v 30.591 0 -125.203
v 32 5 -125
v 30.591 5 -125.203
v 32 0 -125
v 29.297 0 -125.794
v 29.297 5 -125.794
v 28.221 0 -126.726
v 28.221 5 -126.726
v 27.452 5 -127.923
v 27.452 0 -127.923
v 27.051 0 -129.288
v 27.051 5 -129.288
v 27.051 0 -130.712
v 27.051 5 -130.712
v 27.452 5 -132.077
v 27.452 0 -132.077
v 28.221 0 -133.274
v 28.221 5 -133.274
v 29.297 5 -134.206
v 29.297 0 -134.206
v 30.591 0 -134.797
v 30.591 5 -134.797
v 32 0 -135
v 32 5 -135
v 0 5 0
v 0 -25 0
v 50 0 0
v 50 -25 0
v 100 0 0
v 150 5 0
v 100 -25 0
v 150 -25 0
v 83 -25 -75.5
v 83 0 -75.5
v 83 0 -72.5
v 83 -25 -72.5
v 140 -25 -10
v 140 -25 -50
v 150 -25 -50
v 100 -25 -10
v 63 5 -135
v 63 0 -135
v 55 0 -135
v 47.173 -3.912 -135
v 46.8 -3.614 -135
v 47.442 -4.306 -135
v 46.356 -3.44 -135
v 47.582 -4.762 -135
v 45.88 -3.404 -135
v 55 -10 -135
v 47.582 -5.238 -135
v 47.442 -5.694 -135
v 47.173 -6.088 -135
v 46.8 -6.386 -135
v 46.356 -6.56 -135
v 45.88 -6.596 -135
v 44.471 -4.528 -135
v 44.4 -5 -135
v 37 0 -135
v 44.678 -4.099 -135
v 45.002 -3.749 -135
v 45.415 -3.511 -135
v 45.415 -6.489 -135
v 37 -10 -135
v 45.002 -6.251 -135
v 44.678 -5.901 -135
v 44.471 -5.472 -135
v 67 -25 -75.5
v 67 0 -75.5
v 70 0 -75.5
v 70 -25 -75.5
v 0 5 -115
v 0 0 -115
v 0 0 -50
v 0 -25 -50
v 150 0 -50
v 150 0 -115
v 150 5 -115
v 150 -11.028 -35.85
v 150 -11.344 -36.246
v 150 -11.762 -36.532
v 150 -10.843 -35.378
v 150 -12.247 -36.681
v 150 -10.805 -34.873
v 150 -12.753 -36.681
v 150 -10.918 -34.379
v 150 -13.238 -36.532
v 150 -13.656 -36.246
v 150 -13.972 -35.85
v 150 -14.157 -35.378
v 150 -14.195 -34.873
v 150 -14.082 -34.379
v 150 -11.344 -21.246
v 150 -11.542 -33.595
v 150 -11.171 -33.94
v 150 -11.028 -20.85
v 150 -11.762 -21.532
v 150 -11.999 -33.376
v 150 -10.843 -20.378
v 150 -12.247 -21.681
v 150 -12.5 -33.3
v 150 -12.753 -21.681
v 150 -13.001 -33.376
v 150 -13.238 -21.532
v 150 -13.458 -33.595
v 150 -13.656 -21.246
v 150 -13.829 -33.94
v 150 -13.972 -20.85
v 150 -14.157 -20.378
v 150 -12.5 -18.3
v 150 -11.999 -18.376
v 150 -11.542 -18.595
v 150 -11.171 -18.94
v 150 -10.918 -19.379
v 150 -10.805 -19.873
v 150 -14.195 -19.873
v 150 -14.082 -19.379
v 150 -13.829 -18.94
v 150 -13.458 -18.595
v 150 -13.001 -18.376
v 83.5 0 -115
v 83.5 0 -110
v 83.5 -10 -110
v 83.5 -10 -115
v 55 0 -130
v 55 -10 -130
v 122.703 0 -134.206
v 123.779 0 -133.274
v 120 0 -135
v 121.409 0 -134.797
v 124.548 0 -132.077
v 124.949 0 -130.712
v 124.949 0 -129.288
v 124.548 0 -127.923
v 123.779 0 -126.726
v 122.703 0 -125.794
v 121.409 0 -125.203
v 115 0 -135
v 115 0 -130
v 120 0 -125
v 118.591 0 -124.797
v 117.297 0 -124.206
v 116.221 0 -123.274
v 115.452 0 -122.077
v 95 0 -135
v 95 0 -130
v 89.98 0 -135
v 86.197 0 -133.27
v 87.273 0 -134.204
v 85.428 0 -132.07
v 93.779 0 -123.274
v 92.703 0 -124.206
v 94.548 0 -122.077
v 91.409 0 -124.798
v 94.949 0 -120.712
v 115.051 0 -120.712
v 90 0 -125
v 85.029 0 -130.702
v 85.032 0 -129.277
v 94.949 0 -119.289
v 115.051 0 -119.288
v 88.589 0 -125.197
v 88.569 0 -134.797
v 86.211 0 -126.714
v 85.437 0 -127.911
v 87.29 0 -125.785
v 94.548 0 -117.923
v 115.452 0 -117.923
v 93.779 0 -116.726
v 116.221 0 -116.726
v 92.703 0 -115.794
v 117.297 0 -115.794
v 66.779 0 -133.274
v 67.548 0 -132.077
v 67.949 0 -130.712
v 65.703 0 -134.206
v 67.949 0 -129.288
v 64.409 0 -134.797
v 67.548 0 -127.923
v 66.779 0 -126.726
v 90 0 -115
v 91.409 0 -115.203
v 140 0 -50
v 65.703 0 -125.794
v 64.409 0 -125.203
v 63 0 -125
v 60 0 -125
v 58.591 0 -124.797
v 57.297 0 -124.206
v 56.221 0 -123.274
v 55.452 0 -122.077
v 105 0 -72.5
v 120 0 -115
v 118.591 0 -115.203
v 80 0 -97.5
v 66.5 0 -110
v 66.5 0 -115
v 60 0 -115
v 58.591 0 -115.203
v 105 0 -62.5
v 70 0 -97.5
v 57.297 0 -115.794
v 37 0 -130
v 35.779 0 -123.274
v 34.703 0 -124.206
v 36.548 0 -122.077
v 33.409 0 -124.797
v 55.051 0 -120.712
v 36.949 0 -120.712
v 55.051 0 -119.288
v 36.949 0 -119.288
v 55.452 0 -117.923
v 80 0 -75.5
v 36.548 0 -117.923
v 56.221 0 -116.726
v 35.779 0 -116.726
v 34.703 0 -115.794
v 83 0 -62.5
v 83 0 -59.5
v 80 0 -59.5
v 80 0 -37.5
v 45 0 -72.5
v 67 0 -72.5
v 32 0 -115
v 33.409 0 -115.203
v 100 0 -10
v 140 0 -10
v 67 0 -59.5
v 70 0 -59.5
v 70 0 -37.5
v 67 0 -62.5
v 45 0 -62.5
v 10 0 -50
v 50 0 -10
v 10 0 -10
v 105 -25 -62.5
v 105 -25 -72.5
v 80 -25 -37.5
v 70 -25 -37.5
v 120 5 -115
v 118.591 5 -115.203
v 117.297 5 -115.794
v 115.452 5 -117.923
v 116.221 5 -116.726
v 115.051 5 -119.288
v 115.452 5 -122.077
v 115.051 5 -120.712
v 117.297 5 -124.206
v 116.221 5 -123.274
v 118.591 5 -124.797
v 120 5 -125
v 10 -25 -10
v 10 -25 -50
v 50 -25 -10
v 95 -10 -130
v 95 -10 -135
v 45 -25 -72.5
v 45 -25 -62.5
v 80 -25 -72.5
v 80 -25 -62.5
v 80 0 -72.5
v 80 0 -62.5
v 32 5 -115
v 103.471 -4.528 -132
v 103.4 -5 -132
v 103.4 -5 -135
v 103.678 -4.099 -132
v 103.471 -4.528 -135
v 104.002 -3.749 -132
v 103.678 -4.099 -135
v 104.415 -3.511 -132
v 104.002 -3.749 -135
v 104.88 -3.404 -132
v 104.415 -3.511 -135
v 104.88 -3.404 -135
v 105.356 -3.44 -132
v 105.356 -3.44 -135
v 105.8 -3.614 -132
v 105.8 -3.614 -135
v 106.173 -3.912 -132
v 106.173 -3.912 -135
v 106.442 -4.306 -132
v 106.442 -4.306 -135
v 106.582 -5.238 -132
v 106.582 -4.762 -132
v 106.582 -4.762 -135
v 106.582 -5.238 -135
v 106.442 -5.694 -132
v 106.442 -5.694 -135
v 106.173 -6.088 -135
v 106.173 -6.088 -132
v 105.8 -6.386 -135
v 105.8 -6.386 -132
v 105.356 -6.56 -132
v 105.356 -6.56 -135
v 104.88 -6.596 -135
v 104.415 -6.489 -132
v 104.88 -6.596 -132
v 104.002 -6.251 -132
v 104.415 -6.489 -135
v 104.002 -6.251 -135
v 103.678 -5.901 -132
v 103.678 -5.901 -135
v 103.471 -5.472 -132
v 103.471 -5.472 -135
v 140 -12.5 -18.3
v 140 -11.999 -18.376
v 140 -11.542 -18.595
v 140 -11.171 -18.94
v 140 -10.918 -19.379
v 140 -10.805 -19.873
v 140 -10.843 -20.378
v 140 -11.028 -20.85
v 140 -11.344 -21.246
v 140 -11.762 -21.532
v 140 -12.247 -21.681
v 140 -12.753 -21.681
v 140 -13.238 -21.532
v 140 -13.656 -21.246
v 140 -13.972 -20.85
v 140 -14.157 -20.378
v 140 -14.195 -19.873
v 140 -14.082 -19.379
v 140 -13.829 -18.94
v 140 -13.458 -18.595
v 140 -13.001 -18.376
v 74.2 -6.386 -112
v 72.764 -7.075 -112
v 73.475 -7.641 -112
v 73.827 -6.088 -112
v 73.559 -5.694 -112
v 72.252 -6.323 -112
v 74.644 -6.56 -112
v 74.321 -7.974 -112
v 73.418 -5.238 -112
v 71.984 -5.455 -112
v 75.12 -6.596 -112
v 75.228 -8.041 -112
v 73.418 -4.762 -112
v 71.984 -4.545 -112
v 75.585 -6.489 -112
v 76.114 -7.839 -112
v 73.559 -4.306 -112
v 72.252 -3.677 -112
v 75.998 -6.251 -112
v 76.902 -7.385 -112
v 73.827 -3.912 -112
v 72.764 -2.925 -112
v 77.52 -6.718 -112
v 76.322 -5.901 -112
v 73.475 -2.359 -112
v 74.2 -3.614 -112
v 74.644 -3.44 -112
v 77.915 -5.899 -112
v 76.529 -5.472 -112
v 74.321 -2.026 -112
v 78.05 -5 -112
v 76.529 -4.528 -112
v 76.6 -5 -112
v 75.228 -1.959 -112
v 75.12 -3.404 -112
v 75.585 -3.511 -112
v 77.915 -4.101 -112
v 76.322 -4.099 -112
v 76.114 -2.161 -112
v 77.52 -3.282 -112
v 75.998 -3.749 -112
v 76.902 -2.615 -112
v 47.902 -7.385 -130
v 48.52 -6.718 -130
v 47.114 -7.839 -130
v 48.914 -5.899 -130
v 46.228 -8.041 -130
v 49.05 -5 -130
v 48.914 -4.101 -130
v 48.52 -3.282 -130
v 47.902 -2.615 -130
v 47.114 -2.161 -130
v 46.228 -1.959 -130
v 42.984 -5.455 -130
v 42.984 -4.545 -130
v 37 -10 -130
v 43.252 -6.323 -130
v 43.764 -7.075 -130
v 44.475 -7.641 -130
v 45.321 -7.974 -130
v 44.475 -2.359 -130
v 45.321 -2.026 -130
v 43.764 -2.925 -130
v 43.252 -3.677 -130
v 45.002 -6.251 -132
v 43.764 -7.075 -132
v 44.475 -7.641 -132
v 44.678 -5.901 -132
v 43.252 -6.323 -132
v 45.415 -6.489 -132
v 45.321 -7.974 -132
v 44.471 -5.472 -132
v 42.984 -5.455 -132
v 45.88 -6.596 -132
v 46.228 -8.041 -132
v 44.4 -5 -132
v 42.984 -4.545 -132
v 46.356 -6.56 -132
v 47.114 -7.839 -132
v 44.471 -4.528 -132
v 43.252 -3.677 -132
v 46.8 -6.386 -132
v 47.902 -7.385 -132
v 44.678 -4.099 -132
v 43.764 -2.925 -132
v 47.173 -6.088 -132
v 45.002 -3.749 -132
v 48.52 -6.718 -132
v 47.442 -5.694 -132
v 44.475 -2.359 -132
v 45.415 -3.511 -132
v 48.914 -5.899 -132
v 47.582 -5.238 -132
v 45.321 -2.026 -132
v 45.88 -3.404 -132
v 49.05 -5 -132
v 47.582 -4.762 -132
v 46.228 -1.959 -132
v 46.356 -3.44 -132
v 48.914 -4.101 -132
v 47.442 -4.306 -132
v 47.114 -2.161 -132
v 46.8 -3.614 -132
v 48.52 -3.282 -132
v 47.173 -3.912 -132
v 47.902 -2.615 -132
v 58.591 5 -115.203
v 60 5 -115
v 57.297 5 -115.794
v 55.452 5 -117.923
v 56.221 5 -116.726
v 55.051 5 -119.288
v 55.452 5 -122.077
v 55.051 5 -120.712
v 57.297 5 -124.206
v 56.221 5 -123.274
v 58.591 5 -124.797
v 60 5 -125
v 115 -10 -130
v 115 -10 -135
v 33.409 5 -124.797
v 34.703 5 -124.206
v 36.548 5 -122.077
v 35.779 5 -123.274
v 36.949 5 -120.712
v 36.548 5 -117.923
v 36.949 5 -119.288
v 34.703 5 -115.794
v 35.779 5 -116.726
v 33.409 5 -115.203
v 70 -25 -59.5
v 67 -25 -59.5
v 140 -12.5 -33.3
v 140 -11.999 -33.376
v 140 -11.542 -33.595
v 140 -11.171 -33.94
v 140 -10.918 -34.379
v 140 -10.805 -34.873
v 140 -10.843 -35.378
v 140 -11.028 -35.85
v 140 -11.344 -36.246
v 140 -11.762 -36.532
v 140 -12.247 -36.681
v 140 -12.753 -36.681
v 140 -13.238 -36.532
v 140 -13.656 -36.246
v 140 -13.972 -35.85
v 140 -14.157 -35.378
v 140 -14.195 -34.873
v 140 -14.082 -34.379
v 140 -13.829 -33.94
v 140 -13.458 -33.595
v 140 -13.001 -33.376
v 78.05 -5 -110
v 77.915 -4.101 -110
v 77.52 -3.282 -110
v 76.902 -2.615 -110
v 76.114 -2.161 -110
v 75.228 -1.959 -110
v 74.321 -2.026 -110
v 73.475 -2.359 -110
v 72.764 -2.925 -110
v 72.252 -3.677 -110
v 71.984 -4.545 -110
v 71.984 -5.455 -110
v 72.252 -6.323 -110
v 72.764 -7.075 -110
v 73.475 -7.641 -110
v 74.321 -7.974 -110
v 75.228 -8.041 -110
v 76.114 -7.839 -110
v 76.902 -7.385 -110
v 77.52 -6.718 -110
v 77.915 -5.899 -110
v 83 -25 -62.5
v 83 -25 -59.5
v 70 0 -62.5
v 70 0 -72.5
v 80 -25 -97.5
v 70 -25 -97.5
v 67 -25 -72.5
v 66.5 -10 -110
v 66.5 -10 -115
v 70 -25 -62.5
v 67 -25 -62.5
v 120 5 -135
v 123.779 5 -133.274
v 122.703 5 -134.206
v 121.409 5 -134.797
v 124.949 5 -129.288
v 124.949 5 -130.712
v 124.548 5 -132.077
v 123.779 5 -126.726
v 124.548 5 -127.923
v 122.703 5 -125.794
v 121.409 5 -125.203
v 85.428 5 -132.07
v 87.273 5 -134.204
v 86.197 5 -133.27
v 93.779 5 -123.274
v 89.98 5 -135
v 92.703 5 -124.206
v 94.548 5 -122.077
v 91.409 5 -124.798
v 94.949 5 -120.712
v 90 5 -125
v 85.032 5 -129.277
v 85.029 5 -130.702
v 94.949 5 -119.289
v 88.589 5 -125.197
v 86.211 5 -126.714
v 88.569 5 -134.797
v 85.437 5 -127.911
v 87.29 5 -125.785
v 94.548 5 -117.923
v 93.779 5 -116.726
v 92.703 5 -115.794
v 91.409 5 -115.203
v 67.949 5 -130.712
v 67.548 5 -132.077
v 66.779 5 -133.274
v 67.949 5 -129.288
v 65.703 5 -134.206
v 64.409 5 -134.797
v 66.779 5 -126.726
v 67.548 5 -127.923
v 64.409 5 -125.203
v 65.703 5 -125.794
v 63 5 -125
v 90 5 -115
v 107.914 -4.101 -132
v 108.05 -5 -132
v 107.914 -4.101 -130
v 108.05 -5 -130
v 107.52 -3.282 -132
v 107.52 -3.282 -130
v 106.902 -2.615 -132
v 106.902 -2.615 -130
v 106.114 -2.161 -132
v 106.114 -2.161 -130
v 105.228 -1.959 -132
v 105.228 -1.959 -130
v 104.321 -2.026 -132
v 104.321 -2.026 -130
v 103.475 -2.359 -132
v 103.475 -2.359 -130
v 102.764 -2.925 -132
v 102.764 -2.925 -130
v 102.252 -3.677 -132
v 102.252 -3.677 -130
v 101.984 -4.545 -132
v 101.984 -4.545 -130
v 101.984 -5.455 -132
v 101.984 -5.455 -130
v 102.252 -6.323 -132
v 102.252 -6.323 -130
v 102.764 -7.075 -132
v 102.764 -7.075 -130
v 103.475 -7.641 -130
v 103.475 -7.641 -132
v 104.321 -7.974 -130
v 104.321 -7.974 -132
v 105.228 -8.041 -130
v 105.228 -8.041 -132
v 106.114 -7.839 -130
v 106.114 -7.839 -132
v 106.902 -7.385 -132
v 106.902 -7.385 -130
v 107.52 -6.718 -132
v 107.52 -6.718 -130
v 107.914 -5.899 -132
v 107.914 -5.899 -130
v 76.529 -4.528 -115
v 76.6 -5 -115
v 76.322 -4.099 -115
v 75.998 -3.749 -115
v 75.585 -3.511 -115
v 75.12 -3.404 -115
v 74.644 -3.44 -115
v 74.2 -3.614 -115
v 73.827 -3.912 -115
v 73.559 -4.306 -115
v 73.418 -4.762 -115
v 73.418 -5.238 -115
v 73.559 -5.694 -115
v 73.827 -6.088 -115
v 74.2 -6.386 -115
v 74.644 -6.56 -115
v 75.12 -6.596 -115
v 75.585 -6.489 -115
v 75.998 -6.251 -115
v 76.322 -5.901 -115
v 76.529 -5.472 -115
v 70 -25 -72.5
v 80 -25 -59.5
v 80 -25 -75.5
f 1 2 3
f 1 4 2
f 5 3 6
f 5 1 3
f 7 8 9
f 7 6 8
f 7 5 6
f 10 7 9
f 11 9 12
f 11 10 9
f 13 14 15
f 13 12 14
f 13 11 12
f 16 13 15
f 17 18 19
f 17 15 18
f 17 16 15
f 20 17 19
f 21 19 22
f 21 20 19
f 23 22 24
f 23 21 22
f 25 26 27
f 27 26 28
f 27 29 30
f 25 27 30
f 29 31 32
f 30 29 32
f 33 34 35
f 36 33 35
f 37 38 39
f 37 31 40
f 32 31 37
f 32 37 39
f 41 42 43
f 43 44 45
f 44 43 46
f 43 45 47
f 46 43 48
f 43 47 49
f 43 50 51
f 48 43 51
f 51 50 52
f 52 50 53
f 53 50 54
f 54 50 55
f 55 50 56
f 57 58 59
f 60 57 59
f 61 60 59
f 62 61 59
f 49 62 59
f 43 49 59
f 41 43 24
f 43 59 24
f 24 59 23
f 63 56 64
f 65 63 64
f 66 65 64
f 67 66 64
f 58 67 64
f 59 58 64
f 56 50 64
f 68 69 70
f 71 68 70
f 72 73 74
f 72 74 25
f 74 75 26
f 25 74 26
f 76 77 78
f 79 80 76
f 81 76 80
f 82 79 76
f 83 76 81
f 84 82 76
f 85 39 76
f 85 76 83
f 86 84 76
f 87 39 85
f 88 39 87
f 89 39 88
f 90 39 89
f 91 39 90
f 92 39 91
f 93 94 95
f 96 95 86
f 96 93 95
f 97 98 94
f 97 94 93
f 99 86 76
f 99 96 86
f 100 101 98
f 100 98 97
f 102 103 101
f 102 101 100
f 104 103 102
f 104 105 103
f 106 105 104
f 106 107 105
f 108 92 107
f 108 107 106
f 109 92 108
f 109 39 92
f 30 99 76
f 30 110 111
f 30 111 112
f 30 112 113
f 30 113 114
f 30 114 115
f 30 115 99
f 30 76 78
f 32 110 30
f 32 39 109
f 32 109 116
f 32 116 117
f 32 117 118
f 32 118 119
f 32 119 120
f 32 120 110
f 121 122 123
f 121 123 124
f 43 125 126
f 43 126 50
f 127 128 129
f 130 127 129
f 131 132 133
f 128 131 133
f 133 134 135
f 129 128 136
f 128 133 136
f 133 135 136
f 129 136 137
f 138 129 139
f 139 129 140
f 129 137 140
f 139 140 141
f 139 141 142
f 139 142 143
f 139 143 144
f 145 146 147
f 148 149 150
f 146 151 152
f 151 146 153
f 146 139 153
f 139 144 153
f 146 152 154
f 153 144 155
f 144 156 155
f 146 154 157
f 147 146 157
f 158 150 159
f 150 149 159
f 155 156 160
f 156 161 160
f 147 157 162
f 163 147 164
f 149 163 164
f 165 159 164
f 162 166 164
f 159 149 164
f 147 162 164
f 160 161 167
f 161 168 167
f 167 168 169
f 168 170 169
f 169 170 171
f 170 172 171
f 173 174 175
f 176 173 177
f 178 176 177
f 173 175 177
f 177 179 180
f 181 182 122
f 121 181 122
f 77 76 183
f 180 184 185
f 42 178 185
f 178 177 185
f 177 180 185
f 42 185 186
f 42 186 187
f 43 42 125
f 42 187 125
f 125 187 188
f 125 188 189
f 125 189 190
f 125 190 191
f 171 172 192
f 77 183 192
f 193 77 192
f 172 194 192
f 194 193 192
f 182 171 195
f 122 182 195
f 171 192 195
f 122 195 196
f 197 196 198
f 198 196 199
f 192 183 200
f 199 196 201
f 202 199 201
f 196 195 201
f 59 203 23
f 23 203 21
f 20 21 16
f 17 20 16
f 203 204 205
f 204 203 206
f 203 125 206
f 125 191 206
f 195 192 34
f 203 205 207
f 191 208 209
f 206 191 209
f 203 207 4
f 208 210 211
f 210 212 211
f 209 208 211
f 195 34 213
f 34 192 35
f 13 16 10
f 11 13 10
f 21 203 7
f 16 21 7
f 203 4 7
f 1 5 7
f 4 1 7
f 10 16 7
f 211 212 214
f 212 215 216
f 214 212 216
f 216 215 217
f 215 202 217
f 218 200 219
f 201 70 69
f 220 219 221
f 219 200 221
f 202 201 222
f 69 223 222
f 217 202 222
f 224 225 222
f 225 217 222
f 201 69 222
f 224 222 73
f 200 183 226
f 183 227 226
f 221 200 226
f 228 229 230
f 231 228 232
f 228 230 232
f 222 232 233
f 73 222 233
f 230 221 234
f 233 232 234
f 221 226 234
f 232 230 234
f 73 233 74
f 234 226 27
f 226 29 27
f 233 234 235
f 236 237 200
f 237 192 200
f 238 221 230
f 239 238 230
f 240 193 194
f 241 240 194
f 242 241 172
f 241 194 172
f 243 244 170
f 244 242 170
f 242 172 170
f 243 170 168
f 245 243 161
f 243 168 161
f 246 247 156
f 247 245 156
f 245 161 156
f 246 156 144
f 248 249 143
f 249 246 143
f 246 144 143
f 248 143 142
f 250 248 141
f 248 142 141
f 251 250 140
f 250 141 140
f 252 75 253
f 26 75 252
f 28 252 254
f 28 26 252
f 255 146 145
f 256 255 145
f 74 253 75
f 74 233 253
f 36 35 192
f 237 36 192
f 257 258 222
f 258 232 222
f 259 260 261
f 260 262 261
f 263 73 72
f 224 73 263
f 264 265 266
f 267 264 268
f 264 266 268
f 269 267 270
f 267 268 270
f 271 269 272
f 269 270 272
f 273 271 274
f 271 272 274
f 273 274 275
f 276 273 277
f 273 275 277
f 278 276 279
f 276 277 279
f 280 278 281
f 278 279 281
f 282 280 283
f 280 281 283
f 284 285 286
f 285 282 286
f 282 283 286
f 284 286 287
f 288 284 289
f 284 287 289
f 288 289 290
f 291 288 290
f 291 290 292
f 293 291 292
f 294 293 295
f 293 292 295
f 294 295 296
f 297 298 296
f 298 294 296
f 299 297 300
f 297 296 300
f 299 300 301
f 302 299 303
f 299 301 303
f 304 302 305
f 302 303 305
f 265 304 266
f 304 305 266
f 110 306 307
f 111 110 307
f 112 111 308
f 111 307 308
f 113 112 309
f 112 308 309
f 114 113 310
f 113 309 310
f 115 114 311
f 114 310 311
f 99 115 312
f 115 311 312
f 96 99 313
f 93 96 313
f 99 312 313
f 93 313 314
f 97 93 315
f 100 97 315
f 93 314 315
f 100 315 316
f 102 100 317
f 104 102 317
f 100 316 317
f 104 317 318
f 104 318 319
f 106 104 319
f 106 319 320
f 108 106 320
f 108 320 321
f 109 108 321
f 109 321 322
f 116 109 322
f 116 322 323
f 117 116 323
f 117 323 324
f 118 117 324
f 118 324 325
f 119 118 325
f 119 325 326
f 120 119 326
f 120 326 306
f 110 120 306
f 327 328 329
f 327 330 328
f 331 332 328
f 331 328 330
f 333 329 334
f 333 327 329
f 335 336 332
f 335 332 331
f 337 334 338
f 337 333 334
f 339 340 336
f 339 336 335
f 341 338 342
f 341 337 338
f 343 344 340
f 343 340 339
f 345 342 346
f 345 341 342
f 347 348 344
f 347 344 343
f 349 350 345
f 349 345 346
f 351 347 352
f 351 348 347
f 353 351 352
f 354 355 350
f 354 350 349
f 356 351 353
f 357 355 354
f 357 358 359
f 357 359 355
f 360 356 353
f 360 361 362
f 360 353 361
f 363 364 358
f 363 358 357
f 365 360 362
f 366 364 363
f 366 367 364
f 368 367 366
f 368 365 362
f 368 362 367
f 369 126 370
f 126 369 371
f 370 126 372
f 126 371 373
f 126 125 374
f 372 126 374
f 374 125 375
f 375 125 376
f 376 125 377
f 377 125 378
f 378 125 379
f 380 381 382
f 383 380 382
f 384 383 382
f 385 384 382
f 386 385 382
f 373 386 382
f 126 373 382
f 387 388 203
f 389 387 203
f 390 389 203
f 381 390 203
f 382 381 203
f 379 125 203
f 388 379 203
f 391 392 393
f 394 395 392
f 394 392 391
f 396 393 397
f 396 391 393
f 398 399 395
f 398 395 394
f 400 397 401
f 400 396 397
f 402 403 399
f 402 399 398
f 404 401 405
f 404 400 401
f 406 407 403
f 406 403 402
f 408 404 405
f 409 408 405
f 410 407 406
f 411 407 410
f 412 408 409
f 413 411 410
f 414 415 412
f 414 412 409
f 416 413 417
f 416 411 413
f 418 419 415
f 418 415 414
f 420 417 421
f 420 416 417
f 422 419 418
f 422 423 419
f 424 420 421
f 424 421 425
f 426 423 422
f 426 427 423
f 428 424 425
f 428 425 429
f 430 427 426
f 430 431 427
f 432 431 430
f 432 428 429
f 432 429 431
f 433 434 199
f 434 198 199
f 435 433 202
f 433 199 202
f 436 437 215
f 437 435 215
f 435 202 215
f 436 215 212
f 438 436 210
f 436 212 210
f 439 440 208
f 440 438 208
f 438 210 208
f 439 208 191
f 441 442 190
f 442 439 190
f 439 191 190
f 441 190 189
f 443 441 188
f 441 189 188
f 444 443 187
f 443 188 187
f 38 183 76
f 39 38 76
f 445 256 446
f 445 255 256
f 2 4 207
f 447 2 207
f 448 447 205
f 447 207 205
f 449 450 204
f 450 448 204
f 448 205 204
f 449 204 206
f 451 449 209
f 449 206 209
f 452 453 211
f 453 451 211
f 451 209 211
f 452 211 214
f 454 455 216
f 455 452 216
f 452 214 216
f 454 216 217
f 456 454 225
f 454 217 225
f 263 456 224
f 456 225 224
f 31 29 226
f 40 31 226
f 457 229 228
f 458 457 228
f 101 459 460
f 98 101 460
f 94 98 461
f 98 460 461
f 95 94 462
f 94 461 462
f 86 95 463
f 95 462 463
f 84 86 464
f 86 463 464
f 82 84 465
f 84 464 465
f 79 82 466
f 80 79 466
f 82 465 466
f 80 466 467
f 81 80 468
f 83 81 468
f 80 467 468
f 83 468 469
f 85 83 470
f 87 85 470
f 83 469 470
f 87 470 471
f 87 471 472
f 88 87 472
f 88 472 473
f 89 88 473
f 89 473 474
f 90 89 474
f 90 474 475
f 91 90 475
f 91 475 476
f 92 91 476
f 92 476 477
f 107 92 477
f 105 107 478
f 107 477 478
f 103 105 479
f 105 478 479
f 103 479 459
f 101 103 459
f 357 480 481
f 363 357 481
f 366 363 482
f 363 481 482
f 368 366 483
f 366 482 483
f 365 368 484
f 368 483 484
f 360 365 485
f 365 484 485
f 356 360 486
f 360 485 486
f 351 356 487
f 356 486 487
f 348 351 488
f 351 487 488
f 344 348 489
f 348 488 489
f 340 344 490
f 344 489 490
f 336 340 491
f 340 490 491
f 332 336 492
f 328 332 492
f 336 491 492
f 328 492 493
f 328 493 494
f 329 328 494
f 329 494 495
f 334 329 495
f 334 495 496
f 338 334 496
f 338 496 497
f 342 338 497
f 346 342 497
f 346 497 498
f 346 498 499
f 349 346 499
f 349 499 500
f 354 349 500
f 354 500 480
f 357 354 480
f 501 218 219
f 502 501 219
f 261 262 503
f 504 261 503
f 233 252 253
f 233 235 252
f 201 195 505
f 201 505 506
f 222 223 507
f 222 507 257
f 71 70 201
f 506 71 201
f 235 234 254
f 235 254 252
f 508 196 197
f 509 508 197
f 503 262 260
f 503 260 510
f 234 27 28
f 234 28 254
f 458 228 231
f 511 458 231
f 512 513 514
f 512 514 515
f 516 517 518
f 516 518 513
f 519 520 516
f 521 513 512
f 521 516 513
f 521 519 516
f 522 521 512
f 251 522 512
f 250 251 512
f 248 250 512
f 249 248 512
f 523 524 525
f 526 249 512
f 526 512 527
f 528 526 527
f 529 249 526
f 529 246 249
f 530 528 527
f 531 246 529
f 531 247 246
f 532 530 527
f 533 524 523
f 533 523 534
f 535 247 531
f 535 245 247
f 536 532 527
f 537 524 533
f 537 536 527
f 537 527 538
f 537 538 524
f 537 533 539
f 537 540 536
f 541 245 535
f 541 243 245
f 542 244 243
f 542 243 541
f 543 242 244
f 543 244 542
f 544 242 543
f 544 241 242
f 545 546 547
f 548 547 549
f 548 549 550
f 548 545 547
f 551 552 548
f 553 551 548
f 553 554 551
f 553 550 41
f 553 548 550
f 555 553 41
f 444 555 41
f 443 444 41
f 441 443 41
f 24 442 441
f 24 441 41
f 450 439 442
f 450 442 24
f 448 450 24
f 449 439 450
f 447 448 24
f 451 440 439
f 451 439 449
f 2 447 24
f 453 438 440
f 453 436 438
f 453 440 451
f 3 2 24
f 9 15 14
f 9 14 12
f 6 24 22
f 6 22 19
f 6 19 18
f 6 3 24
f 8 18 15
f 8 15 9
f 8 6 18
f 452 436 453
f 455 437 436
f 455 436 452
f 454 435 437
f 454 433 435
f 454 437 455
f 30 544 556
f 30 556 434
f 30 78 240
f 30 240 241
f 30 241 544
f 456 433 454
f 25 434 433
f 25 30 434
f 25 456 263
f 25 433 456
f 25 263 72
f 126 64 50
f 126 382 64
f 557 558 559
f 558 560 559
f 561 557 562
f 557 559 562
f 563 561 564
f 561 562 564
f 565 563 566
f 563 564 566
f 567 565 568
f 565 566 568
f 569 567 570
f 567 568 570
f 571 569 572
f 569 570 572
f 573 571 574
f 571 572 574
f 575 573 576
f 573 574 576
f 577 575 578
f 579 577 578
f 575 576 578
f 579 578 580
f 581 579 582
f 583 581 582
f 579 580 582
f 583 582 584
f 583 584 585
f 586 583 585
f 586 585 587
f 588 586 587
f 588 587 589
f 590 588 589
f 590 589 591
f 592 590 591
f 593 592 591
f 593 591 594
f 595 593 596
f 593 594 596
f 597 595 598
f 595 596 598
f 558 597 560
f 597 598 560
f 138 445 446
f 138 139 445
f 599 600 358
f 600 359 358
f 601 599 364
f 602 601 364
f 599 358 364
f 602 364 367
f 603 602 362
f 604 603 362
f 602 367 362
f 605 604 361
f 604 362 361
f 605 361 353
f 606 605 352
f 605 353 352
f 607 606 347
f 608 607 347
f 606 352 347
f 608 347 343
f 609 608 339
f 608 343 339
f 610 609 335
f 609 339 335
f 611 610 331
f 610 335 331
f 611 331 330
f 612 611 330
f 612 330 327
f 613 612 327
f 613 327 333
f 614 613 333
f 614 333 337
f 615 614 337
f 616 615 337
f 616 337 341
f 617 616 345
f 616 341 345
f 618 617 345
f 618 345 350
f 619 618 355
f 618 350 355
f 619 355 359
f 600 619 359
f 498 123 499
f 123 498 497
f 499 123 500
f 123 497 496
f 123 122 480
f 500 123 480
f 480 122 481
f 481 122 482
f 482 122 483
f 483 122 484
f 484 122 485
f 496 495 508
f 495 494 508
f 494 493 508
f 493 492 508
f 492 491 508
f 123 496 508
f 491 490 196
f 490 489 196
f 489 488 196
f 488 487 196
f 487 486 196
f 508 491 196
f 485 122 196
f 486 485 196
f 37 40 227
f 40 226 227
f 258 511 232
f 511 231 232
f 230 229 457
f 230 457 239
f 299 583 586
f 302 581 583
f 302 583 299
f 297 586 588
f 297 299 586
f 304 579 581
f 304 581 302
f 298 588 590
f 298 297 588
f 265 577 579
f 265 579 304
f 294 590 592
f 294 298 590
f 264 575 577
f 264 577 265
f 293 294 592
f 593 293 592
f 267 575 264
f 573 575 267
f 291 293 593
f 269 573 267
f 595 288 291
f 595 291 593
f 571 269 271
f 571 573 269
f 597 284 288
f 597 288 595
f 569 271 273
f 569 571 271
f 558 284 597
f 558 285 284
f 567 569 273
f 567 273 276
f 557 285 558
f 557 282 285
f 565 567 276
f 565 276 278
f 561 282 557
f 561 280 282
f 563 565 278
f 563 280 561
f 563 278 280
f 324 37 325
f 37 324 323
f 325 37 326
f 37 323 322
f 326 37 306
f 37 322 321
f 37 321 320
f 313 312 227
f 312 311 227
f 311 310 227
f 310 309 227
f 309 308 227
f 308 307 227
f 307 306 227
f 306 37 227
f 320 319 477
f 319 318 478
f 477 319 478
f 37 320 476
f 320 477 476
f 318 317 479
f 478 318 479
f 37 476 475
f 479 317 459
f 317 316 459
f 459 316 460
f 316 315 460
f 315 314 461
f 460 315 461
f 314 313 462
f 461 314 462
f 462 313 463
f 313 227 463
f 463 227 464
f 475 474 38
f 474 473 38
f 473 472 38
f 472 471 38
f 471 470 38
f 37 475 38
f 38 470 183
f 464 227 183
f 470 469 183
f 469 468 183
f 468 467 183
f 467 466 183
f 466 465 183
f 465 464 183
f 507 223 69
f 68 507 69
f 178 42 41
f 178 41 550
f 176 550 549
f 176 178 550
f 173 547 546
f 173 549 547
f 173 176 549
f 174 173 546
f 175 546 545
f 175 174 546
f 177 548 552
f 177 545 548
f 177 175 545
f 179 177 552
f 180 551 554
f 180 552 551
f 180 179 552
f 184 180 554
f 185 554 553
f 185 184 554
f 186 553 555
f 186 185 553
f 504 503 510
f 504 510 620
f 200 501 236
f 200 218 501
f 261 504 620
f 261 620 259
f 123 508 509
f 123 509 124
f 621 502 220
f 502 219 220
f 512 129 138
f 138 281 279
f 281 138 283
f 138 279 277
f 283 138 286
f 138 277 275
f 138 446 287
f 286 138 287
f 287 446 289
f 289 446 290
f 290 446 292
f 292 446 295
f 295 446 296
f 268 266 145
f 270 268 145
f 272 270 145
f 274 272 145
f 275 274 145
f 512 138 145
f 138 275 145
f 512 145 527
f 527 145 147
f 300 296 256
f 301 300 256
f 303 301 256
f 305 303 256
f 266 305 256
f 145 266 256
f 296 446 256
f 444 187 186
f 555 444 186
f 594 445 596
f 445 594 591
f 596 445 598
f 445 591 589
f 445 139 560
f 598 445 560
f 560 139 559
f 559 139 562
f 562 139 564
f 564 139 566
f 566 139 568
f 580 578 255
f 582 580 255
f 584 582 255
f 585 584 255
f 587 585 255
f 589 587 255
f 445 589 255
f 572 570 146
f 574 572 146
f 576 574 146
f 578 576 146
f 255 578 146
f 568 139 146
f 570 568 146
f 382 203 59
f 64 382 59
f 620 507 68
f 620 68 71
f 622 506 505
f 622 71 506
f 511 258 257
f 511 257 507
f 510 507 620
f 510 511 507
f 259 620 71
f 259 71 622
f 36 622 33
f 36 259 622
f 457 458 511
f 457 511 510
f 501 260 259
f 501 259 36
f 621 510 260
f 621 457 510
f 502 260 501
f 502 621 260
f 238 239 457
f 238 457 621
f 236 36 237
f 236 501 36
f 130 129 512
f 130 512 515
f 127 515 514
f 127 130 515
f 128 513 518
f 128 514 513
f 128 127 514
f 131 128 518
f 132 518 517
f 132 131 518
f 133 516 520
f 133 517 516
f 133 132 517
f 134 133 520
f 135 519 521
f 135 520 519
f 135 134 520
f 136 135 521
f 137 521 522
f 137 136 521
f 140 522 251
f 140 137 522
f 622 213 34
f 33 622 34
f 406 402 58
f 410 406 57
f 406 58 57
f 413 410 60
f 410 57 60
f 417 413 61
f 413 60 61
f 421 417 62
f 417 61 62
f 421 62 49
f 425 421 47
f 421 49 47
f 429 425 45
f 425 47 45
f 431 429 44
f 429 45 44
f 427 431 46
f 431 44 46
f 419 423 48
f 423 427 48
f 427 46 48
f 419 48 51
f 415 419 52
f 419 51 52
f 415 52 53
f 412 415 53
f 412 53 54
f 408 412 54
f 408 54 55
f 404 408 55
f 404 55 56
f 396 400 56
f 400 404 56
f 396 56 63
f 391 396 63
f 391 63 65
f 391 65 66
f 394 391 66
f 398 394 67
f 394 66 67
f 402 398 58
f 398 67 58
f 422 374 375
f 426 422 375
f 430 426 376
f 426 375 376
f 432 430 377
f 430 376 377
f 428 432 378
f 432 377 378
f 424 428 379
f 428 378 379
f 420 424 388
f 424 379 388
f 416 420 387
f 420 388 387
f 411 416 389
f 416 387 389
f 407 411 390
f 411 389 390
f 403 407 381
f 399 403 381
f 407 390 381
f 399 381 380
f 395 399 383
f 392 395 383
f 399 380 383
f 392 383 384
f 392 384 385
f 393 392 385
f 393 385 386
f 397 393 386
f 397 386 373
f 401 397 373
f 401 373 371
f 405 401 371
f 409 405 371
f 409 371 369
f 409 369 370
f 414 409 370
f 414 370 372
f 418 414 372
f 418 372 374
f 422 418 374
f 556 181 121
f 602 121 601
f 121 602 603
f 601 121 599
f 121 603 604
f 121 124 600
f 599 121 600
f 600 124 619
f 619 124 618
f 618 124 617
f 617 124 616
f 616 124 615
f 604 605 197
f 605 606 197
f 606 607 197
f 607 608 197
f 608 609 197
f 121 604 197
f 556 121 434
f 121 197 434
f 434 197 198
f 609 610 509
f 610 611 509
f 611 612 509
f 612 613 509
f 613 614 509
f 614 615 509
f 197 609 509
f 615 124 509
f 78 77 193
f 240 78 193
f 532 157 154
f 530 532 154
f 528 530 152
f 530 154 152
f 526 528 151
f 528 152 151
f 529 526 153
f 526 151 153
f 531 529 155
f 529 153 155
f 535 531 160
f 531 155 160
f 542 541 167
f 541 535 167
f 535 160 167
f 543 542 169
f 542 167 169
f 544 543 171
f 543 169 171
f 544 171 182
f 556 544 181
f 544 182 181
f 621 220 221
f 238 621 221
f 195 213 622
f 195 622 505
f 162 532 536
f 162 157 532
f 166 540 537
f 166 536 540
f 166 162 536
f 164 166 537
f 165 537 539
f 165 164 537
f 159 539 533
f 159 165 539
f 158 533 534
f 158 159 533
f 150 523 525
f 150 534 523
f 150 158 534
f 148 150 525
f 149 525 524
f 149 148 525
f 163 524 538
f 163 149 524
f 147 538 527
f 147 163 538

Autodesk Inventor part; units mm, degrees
ref_plane "YZ Plane" through (0, 0, 0) normal (1, 0, 0) x (0, 1, 0)
ref_plane "XZ Plane" through (0, 0, 0) normal (0, 1, 0) x (-1, 0, 0)
ref_plane "XY Plane" through (0, 0, 0) normal (0, 0, 1) x (1, 0, 0)
sketch "puzzle" plane through (0, 0, 0) normal (0, 1, 0) x (-1, 0, 0)
  line L0 (0, 0) -> (-150, 0)
  line L1 (0, -115) -> (-15, -115)
  line L2 (-135, -115) -> (-125, -115)
  line L3 (-135, -115) -> (-150, -115)
  line L4 (-75, -115) -> (-65, -115)
  line L5 (-75, -115) -> (-85.0002, -115)
  line L6 (-105, -135) -> (-94.9796, -135)
  line L7 (-94.9796, -135) -> (-115, -135)
  line L8 (-65, -115) -> (-60, -115)
  line L9 (-60, -125) -> (-63, -125)
  arc A0 (-60, -125) -> (-60, -115) centre (-60, -120) ccw
  arc A1 (-63, -125) -> (-63, -135) centre (-63, -130) ccw
  line L10 (-85.0002, -115) -> (-90.0002, -115)
  line L11 (-94.9796, -135) -> (-89.9796, -135)
  arc A2 (-90.0002, -115) -> (-90, -125) centre (-90.0002, -120) ccw
  arc A3 (-89.9796, -135) -> (-90, -125) centre (-89.9796, -130) ccw
  line L12 (-115, -135) -> (-120, -135)
  line L13 (-125, -115) -> (-120, -115)
  arc A4 (-120, -125) -> (-120, -115) centre (-120, -120) ccw
  arc A5 (-120, -125) -> (-120, -135) centre (-120, -130) ccw
  line L14 (0, -115) -> (-30, -115)
  line L15 (-63, -135) -> (-32.98, -135)
  line L16 (-32.98, -135) -> (-32, -135)
  line L17 (-30, -115) -> (-32, -115)
  arc A6 (-32, -115) -> (-32, -125) centre (-32, -120) ccw
  arc A7 (-32, -135) -> (-32, -125) centre (-32, -130) ccw
  line L18 (-150, -115) -> (-150, 0)
  line L19 (0, -115) -> (0, 0)
  dimension "d22" = 5
  dimension "d23" = 5
  dimension "d24" = 5
  dimension "d25" = 5
  dimension "d26" = 5
extrude "Extrusión1" add sketch "puzzle" along normal blind 5
sketch "peus" plane through (0, 0, 0) normal (0, -1, 0) x (1, 0, 0)
  line L0 (150, 0) -> (145, 0)
  line L1 (150, 0) -> (100, 0)
  line L2 (0, -115) -> (0, 0) projected
  line L3 (0, 0) -> (50, 0)
  line L4 (50, 0) -> (50, -10)
  line L5 (0, 0) -> (10, 0)
  line L6 (10, -50) -> (0, -50)
  line L7 (0, -50) -> (0, 0)
  line L8 (50, -10) -> (10, -10)
  line L9 (10, -10) -> (10, -50)
  line L10 (100, 0) -> (100, -10)
  line L11 (100, -10) -> (140, -10)
  line L12 (140, -10) -> (140, -50)
  line L13 (140, -50) -> (150, -50)
  line L14 (150, 0) -> (150, -115) projected
  line L15 (150, 0) -> (150, -50)
  line L16 (0, 0) -> (150, 0) projected
  line L17 (45, -62.5) -> (45, -72.5)
  line L18 (105, -72.5) -> (105, -62.5)
  line L19 (80, -97.5) -> (70, -97.5)
  line L20 (80, -37.5) -> (70, -37.5)
  line L21 (80, -62.5) -> (70, -62.5)
  line L22 (70, -62.5) -> (70, -72.5)
  line L23 (70, -72.5) -> (80, -72.5)
  line L24 (80, -62.5) -> (80, -72.5)
  line L25 (83, -62.5) -> (83, -59.5)
  line L26 (83, -59.5) -> (80, -59.5)
  line L27 (70, -59.5) -> (67, -59.5)
  line L28 (67, -59.5) -> (67, -62.5)
  line L29 (67, -72.5) -> (67, -75.5)
  line L30 (67, -75.5) -> (70, -75.5)
  line L31 (80, -75.5) -> (83, -75.5)
  line L32 (83, -75.5) -> (83, -72.5)
  line L33 (83, -72.5) -> (105, -72.5)
  line L34 (83, -62.5) -> (105, -62.5)
  line L35 (80, -59.5) -> (80, -37.5)
  line L36 (70, -59.5) -> (70, -37.5)
  line L37 (67, -62.5) -> (45, -62.5)
  line L38 (67, -72.5) -> (45, -72.5)
  line L39 (70, -75.5) -> (70, -97.5)
  line L40 (80, -75.5) -> (80, -97.5)
  line L41 (83, -72.5) -> (105, -72.5)
  dimension "d70" = 3
extrude "Extrusión3" add sketch "peus" along normal blind 25
sketch "Boceto4" plane through (0, 0, 0) normal (0, -1, 0) x (1, 0, 0)
  line L0 (55, -135) -> (37, -135)
  line L1 (120, -135) -> (89.9796, -135) projected
  line L2 (115, -135) -> (95, -135)
  line L3 (90.0002, -115) -> (60, -115) projected
  line L4 (75.0001, -115) -> (83.5001, -115)
  line L5 (83.5001, -115) -> (66.5001, -115)
  line L6 (83.5001, -110) -> (66.5001, -110)
  line L7 (83.5001, -110) -> (83.5001, -115)
  line L8 (66.5001, -110) -> (66.5001, -115)
  line L9 (55, -130) -> (37, -130)
  line L10 (55, -130) -> (55, -135)
  line L11 (37, -130) -> (37, -135)
  line L12 (115, -130) -> (95, -130)
  line L13 (95, -130) -> (95, -135)
  line L14 (115, -130) -> (115, -135)
  point P0 (0, 0)
extrude "Extrusión4" add sketch "Boceto4" along normal blind 10
sketch "Boceto5" plane through (55, 0, -135) normal (0, 0, -1) x (-1, 0, 0)
  circle A0 centre (9, -5) radius 1.6
  circle A1 centre (-50, -5) radius 1.6
  point P0 (55, 0)
  dimension "d81" = 3.2
  dimension "d82" = 3.2
extrude "Extrusión5" cut sketch "Boceto5" against normal blind 14.25
sketch "Boceto6" plane through (95, 0, -130) normal (0, 0, 1) x (1, 0, 0)
  circle A0 centre (-49, -5) radius 1.6 projected
  circle A1 centre (-49, -5) radius 3.05
  circle A2 centre (10, -5) radius 1.6 projected
  circle A3 centre (10, -5) radius 3.05
  point P0 (-95, 0)
  dimension "d85" = 6.1
  dimension "d86" = 6.1
extrude "Extrusión6" cut sketch "Boceto6" against normal blind 2
sketch "Boceto7" plane through (66.5001, 0, -110) normal (0, 0, 1) x (1, 0, 0)
  line L0 (17, -10) -> (0, -10) projected
  line L1 (8.5, -10) -> (8.5, 0)
  line L2 (0, 0) -> (17, 0) projected
  circle A0 centre (8.5, -5) radius 3.05
  point P0 (-66.5001, 0)
  dimension "d89" = 6.1
extrude "Extrusión7" cut sketch "Boceto7" against normal blind 2
sketch "Boceto8" plane through (66.5001, 0, -110) normal (0, 0, 1) x (1, 0, 0)
  circle A0 centre (8.5, -5) radius 3.05 projected
  circle A1 centre (8.5, -5) radius 1.6
  point P0 (-66.5001, 0)
  dimension "d92" = 3.2
extrude "Extrusión8" cut sketch "Boceto8" against normal blind 13 contours A1
sketch "Boceto9" plane through (140, 0, -50) normal (-1, 0, 0) x (0, 0, 1)
  line L0 (0, 0) -> (0, -25) projected
  line L1 (0, -25) -> (40, -25)
  line L2 (40, -25) -> (0, -25) projected
  line L3 (0, 0) -> (40, 0) projected
  line L4 (0, 0) -> (0, -25) projected
  line L5 (0, -25) -> (15, -25)
  line L6 (15, -25) -> (15, 0)
  line L7 (15, -25) -> (30, -25)
  line L8 (30, -25) -> (30, 0)
  circle A0 centre (15, -12.5) radius 1.7
  circle A1 centre (30, -12.5) radius 1.7
  point P0 (50, 0)
  dimension "d96" = 15
  dimension "d97" = 15
  dimension "d98" = 3.4
  dimension "d99" = 3.4
extrude "Extrusión9" cut sketch "Boceto9" against normal blind 19.75 contours A0 L6 | L6 A0 | A1 L8 | L8 A1
properties part number "base auxiliar 1"
